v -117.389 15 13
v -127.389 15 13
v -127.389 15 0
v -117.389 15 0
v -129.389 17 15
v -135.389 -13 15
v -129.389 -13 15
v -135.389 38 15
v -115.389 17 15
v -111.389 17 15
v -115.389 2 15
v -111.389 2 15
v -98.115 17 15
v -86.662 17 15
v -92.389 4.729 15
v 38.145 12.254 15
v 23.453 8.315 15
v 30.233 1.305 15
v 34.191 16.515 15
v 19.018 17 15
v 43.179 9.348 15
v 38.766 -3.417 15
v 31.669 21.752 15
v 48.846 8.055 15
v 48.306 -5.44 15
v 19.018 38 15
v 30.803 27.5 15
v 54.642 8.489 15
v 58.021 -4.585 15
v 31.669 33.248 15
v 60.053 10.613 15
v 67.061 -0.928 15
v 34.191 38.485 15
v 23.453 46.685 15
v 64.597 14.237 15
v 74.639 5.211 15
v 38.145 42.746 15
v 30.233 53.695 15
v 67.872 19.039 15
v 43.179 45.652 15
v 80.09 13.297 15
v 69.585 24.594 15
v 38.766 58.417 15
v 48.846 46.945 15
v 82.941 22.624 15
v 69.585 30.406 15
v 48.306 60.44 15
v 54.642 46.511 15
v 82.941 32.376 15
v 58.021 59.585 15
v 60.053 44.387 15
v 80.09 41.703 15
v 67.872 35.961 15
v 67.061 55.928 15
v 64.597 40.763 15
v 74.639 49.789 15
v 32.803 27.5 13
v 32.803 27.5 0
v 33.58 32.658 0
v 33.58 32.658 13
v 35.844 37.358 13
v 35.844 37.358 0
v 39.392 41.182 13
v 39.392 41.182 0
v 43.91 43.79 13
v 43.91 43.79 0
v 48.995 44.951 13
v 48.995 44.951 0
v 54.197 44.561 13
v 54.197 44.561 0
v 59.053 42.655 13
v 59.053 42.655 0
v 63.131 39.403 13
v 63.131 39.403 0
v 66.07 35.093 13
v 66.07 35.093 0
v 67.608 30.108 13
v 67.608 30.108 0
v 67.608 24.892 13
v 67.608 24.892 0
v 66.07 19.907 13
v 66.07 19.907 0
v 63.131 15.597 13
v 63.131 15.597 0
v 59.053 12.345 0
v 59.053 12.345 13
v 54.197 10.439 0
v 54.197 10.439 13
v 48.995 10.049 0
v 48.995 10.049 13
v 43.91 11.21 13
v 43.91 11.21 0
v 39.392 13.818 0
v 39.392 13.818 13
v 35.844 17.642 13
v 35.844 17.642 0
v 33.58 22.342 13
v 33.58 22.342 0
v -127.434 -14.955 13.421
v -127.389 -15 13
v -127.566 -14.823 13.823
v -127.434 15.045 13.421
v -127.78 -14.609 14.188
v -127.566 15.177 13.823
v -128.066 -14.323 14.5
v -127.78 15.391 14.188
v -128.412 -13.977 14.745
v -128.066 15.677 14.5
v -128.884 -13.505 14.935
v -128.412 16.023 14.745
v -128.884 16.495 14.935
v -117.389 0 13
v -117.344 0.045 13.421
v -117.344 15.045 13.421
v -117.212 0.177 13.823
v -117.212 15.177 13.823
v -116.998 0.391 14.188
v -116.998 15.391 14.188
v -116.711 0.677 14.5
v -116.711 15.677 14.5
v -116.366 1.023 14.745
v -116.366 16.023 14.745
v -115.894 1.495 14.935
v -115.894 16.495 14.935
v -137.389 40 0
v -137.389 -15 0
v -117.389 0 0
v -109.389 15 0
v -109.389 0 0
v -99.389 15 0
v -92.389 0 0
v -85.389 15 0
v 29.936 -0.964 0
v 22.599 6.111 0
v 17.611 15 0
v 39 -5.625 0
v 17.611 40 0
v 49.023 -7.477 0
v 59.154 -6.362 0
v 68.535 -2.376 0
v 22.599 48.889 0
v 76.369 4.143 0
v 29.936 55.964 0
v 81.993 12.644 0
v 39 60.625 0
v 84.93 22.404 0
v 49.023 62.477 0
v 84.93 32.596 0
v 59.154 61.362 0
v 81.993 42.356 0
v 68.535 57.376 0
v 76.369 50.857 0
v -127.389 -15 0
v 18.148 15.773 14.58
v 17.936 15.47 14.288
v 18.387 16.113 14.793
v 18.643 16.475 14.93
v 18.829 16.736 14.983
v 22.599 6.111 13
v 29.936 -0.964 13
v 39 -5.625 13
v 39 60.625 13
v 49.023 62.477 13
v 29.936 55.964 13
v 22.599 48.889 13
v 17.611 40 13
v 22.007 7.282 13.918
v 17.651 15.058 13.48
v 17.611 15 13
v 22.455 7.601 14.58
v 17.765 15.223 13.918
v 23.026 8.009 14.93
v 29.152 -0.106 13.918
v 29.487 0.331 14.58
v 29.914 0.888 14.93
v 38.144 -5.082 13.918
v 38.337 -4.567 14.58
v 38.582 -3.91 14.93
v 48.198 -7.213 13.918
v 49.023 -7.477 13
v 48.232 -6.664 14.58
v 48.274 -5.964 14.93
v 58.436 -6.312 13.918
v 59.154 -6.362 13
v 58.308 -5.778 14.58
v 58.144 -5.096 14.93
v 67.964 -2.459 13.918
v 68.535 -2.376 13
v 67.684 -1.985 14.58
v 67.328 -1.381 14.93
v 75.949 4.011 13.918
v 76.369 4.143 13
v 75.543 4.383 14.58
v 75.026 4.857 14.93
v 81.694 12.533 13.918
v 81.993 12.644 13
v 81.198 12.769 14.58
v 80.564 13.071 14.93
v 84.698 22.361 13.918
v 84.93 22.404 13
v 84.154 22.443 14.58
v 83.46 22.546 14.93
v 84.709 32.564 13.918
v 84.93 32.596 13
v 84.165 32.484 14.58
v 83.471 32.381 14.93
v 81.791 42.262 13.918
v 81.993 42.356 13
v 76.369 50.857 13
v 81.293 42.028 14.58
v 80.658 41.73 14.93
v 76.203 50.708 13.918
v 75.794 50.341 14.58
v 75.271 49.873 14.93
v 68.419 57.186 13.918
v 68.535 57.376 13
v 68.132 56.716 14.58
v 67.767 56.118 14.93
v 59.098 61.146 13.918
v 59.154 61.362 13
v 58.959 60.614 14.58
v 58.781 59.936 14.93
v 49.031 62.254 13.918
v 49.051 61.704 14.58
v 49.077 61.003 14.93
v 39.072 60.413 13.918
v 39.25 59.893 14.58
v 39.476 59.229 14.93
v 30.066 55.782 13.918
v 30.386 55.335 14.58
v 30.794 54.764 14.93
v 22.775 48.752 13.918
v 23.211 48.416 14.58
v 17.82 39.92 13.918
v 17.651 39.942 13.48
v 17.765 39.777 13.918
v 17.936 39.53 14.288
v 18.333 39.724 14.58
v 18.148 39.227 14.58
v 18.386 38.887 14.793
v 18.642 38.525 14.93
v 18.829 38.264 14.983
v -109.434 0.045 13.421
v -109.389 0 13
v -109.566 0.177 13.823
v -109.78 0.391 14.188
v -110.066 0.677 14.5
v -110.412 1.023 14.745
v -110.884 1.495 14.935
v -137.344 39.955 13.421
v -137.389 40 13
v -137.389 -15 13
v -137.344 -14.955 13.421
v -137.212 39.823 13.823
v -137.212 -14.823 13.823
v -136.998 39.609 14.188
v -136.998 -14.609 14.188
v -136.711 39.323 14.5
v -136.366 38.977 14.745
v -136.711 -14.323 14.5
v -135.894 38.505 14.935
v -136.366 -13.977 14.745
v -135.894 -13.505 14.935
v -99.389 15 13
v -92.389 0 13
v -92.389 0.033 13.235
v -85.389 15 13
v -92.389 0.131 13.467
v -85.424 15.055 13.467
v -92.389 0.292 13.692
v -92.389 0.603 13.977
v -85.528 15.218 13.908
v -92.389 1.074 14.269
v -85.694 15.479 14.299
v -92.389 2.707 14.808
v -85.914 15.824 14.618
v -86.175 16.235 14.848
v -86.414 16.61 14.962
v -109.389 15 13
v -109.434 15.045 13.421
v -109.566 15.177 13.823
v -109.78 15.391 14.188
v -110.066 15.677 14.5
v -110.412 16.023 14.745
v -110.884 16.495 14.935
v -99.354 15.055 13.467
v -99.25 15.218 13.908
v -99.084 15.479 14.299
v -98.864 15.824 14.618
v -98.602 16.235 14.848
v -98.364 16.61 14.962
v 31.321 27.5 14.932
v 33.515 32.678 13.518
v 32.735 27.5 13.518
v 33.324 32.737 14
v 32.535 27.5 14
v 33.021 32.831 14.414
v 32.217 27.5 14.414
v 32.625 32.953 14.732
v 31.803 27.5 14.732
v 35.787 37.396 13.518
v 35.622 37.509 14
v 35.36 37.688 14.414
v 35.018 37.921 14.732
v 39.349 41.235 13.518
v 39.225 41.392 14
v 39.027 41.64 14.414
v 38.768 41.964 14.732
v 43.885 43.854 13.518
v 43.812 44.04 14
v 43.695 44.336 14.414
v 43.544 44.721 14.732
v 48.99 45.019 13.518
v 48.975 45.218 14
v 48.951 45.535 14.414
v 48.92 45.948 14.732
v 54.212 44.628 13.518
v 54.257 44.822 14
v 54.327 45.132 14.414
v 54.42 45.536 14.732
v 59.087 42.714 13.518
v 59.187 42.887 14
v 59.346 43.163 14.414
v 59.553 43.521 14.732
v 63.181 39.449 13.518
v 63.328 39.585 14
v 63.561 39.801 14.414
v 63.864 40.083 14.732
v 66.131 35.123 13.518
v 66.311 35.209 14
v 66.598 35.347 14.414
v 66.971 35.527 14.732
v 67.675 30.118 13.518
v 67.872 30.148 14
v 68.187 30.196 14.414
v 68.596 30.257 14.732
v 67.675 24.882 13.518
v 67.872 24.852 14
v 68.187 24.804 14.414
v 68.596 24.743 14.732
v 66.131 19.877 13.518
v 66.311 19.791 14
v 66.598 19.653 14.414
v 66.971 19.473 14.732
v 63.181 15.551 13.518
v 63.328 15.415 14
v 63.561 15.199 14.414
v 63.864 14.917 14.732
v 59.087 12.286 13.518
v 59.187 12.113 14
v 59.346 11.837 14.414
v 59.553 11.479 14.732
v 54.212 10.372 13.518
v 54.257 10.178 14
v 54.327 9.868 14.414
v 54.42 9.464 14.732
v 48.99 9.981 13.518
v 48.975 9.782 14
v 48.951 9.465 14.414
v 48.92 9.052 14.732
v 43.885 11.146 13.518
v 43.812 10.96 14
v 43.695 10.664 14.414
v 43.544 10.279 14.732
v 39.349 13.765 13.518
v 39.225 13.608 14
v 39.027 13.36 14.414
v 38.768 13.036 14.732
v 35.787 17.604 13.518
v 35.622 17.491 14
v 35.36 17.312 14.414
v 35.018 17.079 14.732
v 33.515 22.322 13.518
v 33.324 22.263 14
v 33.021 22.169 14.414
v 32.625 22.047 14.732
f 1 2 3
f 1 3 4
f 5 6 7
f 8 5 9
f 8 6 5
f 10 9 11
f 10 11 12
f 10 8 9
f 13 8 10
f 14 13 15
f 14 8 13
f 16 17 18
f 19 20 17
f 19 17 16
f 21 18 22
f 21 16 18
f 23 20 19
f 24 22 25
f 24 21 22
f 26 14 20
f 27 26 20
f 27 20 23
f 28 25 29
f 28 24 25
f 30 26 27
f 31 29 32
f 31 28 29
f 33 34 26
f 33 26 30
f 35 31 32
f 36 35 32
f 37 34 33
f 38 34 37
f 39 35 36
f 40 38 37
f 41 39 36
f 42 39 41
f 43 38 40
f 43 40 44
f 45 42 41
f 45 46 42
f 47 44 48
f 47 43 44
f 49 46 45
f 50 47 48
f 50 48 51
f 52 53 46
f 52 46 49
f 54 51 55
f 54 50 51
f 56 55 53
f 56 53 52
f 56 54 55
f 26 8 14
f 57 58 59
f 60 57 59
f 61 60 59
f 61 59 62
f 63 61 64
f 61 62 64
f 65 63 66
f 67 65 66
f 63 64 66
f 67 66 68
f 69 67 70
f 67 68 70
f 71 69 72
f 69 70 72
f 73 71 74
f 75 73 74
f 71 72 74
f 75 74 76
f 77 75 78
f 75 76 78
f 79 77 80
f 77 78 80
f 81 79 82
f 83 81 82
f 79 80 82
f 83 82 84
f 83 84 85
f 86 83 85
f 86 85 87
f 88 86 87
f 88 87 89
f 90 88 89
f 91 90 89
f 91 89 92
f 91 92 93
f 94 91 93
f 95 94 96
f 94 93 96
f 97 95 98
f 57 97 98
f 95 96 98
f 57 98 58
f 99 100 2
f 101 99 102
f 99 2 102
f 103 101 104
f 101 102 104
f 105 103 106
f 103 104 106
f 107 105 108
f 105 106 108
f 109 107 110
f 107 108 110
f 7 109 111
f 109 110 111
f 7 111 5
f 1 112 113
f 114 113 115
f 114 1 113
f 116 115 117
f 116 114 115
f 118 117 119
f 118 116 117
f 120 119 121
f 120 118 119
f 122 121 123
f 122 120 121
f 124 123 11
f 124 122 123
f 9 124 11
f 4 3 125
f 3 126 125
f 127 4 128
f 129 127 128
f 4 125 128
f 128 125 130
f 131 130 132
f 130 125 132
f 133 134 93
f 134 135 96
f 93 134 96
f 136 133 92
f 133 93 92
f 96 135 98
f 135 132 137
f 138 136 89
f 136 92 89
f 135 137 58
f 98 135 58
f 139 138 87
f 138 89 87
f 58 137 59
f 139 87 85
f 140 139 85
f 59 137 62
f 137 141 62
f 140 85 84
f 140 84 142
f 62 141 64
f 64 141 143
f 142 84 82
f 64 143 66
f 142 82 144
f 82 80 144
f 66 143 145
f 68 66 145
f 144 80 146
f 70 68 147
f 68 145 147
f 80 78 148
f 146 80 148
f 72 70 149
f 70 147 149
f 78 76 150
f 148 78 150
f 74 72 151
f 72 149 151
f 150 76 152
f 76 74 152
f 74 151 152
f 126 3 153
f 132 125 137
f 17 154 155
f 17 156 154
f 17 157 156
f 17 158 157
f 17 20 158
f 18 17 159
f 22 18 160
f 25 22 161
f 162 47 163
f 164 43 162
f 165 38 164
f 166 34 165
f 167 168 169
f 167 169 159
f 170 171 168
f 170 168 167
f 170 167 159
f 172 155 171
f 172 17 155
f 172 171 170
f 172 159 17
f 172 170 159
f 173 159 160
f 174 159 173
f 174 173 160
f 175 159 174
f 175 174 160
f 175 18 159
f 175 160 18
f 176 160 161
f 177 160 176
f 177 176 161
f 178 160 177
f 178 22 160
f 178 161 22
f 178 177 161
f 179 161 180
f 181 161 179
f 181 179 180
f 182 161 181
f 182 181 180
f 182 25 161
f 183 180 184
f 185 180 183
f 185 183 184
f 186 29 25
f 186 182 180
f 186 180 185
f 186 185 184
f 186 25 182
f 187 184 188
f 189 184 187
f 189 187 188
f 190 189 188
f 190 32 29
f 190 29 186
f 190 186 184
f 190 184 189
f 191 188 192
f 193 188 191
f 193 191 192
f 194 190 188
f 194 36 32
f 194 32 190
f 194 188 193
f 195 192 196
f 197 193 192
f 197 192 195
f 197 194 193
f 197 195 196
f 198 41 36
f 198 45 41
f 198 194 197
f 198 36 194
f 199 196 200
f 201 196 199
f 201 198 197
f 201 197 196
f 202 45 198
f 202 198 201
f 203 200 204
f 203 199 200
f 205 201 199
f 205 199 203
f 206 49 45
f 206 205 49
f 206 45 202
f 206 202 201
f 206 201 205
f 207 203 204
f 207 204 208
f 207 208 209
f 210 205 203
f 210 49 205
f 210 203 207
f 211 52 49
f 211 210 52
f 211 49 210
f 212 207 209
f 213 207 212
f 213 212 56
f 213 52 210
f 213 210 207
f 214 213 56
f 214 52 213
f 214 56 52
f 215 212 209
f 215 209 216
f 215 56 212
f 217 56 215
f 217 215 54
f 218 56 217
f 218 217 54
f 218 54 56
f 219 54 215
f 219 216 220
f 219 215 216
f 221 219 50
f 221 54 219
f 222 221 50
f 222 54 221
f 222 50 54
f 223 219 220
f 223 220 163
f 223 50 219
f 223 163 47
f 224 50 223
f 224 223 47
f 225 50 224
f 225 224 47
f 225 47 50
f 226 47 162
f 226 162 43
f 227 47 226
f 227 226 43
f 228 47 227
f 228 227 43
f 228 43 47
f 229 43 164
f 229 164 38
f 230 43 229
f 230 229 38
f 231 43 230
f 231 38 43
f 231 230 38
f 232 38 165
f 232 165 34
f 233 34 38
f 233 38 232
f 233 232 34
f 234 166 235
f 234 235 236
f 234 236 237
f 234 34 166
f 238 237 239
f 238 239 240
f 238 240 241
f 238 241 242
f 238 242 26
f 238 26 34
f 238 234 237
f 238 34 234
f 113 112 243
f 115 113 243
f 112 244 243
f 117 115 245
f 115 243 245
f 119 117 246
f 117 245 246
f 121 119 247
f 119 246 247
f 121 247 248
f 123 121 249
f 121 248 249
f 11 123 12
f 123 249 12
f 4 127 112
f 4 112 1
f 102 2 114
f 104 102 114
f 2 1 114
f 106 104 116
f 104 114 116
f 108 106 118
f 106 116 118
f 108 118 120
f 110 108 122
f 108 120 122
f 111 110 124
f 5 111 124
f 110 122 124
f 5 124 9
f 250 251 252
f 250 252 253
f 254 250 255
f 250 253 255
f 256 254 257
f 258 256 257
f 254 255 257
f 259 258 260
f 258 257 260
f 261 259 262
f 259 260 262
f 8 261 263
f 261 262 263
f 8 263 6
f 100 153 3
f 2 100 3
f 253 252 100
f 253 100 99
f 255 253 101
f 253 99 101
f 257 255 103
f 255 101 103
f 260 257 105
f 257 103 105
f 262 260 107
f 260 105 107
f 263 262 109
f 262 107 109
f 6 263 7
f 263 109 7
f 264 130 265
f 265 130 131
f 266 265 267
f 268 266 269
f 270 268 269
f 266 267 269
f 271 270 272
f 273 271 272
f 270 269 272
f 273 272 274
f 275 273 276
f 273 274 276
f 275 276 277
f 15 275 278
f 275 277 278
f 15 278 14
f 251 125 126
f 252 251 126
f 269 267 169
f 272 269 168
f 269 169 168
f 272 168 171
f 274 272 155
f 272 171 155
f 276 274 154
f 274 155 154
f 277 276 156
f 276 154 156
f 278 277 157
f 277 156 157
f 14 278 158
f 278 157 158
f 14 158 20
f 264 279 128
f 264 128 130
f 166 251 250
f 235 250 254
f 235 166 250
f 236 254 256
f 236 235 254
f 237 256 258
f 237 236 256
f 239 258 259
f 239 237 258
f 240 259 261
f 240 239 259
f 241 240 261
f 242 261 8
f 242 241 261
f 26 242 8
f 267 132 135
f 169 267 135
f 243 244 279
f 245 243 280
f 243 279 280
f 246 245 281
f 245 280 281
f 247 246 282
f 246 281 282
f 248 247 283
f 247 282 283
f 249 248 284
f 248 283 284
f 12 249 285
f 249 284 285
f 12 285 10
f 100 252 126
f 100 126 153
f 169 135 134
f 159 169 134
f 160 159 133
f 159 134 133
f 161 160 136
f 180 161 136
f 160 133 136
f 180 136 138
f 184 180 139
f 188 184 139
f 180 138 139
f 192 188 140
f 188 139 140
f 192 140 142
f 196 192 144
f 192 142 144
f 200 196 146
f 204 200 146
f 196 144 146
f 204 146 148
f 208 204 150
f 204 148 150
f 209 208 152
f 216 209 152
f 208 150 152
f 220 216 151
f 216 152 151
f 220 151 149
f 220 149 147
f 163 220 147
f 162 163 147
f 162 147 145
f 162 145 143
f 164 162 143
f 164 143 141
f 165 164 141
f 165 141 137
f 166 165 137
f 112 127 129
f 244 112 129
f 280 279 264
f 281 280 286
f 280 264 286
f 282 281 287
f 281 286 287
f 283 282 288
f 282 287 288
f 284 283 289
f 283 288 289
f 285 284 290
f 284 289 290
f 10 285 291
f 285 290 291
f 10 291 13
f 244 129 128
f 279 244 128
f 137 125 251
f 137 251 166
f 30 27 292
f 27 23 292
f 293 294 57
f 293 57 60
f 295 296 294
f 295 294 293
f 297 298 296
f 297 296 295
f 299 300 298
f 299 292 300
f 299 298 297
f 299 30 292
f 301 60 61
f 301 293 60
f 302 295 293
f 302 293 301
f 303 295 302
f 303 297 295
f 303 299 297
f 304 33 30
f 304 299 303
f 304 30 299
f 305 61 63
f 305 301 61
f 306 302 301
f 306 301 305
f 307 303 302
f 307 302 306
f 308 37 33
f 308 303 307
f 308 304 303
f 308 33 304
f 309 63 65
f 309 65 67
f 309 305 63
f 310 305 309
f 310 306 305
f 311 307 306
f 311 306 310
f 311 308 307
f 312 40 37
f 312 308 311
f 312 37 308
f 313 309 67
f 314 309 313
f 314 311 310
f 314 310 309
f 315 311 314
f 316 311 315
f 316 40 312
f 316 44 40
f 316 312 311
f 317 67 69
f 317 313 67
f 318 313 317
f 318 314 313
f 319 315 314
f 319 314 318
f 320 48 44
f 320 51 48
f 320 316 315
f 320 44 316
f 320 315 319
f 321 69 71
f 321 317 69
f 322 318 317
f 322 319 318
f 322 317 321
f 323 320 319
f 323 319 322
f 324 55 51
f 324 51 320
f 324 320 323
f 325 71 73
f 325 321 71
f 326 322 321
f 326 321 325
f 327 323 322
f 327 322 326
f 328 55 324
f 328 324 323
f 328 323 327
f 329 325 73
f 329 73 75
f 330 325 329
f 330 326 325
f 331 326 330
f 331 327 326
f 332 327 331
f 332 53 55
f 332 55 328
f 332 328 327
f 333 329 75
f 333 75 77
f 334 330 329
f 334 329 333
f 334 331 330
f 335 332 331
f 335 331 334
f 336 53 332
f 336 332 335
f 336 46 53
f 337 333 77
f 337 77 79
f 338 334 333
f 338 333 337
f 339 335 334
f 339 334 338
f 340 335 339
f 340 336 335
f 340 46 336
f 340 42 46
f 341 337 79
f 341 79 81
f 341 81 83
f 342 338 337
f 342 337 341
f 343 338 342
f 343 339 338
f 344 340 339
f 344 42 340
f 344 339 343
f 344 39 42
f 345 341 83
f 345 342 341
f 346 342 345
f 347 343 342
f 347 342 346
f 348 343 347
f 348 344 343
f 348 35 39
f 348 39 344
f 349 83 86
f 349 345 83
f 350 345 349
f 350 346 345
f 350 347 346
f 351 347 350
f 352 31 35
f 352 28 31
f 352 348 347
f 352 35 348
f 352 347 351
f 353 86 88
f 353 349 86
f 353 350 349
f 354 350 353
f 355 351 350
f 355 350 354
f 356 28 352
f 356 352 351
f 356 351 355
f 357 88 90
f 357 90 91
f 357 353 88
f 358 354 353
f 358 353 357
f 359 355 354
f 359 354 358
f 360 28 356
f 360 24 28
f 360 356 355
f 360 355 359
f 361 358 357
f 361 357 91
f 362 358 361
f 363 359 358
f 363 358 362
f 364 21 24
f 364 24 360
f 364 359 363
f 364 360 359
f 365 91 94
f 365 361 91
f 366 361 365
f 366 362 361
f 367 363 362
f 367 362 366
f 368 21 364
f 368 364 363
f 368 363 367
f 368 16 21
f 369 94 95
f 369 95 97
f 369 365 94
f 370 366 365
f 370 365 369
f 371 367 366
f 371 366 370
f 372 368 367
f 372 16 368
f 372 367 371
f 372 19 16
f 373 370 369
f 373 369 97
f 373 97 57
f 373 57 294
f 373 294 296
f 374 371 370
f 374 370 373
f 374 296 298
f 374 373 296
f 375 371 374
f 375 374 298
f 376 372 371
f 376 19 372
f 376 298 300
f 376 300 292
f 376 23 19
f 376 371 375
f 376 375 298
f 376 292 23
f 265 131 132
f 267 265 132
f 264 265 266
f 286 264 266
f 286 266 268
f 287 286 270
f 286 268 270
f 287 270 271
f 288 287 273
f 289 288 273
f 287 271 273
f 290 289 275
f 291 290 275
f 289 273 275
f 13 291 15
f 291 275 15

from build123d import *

# Parameters (mm, degrees)
F0_W     = 155
F0_H     = 12.5
F0_W_2   = 8
F0_H_2   = 15
F0_W_3   = 10
F0_H_3   = 30
F1_DEPTH = 15
F2_R     = 2


with BuildPart() as f1:
    # F0 (on Top) → F1 (new body)
    with BuildSketch(Plane.XY):
        with Locations((-59.8887689211, 33.75)):
            Rectangle(F0_W, F0_H)
        Polygon((17.6112310789, 27.5), (-137.3887689211, 27.5), (-137.3887689211, 15), (-127.3887689211, 15), (-117.3887689211, 15), (-109.3887689211, 15), (-99.3887689211, 15), (-85.3887689211, 15), (17.6112310789, 15), align=None)
        with BuildLine():
            ThreePointArc((17.6112310789, 15), (85.3029731554, 27.5), (17.6112310789, 40))
            Line((17.6112310789, 40), (17.6112310789, 27.5))
            Line((17.6112310789, 27.5), (17.6112310789, 15))
        make_face()
        with BuildLine():
            ThreePointArc((67.8029731554, 27.5), (50.3029731554, 10), (32.8029731554, 27.5))
            ThreePointArc((32.8029731554, 27.5), (50.3029731554, 45), (67.8029731554, 27.5))
        make_face(mode=Mode.SUBTRACT)
        Polygon((-92.3888981342, 0), (-85.3887689211, 15), (-99.3887689211, 15), align=None)
        with Locations((-113.3887689211, 7.5)):
            Rectangle(F0_W_2, F0_H_2)
        with Locations((-132.3887689211, 0)):
            Rectangle(F0_W_3, F0_H_3)
    extrude(amount=F1_DEPTH)

    # F2
    f2_edges = [f1.edges().sort_by_distance(p)[0] for p in [
        (-59.888769, 40, 15),
        (85.302973, 27.5, 15),
        (-33.888769, 15, 15),
        (-88.888834, 7.5, 15),
        (-122.388769, 15, 15),
        (-109.388769, 7.5, 15),
        (-132.388769, -15, 15),
        (-127.388769, 0, 15),
        (-137.388769, 12.5, 15),
        (-113.388769, 0, 15),
        (-117.388769, 7.5, 15),
        (-95.888834, 7.5, 15),
        (67.802973, 27.5, 15),
        (-104.388769, 15, 15),
    ]]
    fillet(f2_edges, radius=F2_R)


solid = f1.part
